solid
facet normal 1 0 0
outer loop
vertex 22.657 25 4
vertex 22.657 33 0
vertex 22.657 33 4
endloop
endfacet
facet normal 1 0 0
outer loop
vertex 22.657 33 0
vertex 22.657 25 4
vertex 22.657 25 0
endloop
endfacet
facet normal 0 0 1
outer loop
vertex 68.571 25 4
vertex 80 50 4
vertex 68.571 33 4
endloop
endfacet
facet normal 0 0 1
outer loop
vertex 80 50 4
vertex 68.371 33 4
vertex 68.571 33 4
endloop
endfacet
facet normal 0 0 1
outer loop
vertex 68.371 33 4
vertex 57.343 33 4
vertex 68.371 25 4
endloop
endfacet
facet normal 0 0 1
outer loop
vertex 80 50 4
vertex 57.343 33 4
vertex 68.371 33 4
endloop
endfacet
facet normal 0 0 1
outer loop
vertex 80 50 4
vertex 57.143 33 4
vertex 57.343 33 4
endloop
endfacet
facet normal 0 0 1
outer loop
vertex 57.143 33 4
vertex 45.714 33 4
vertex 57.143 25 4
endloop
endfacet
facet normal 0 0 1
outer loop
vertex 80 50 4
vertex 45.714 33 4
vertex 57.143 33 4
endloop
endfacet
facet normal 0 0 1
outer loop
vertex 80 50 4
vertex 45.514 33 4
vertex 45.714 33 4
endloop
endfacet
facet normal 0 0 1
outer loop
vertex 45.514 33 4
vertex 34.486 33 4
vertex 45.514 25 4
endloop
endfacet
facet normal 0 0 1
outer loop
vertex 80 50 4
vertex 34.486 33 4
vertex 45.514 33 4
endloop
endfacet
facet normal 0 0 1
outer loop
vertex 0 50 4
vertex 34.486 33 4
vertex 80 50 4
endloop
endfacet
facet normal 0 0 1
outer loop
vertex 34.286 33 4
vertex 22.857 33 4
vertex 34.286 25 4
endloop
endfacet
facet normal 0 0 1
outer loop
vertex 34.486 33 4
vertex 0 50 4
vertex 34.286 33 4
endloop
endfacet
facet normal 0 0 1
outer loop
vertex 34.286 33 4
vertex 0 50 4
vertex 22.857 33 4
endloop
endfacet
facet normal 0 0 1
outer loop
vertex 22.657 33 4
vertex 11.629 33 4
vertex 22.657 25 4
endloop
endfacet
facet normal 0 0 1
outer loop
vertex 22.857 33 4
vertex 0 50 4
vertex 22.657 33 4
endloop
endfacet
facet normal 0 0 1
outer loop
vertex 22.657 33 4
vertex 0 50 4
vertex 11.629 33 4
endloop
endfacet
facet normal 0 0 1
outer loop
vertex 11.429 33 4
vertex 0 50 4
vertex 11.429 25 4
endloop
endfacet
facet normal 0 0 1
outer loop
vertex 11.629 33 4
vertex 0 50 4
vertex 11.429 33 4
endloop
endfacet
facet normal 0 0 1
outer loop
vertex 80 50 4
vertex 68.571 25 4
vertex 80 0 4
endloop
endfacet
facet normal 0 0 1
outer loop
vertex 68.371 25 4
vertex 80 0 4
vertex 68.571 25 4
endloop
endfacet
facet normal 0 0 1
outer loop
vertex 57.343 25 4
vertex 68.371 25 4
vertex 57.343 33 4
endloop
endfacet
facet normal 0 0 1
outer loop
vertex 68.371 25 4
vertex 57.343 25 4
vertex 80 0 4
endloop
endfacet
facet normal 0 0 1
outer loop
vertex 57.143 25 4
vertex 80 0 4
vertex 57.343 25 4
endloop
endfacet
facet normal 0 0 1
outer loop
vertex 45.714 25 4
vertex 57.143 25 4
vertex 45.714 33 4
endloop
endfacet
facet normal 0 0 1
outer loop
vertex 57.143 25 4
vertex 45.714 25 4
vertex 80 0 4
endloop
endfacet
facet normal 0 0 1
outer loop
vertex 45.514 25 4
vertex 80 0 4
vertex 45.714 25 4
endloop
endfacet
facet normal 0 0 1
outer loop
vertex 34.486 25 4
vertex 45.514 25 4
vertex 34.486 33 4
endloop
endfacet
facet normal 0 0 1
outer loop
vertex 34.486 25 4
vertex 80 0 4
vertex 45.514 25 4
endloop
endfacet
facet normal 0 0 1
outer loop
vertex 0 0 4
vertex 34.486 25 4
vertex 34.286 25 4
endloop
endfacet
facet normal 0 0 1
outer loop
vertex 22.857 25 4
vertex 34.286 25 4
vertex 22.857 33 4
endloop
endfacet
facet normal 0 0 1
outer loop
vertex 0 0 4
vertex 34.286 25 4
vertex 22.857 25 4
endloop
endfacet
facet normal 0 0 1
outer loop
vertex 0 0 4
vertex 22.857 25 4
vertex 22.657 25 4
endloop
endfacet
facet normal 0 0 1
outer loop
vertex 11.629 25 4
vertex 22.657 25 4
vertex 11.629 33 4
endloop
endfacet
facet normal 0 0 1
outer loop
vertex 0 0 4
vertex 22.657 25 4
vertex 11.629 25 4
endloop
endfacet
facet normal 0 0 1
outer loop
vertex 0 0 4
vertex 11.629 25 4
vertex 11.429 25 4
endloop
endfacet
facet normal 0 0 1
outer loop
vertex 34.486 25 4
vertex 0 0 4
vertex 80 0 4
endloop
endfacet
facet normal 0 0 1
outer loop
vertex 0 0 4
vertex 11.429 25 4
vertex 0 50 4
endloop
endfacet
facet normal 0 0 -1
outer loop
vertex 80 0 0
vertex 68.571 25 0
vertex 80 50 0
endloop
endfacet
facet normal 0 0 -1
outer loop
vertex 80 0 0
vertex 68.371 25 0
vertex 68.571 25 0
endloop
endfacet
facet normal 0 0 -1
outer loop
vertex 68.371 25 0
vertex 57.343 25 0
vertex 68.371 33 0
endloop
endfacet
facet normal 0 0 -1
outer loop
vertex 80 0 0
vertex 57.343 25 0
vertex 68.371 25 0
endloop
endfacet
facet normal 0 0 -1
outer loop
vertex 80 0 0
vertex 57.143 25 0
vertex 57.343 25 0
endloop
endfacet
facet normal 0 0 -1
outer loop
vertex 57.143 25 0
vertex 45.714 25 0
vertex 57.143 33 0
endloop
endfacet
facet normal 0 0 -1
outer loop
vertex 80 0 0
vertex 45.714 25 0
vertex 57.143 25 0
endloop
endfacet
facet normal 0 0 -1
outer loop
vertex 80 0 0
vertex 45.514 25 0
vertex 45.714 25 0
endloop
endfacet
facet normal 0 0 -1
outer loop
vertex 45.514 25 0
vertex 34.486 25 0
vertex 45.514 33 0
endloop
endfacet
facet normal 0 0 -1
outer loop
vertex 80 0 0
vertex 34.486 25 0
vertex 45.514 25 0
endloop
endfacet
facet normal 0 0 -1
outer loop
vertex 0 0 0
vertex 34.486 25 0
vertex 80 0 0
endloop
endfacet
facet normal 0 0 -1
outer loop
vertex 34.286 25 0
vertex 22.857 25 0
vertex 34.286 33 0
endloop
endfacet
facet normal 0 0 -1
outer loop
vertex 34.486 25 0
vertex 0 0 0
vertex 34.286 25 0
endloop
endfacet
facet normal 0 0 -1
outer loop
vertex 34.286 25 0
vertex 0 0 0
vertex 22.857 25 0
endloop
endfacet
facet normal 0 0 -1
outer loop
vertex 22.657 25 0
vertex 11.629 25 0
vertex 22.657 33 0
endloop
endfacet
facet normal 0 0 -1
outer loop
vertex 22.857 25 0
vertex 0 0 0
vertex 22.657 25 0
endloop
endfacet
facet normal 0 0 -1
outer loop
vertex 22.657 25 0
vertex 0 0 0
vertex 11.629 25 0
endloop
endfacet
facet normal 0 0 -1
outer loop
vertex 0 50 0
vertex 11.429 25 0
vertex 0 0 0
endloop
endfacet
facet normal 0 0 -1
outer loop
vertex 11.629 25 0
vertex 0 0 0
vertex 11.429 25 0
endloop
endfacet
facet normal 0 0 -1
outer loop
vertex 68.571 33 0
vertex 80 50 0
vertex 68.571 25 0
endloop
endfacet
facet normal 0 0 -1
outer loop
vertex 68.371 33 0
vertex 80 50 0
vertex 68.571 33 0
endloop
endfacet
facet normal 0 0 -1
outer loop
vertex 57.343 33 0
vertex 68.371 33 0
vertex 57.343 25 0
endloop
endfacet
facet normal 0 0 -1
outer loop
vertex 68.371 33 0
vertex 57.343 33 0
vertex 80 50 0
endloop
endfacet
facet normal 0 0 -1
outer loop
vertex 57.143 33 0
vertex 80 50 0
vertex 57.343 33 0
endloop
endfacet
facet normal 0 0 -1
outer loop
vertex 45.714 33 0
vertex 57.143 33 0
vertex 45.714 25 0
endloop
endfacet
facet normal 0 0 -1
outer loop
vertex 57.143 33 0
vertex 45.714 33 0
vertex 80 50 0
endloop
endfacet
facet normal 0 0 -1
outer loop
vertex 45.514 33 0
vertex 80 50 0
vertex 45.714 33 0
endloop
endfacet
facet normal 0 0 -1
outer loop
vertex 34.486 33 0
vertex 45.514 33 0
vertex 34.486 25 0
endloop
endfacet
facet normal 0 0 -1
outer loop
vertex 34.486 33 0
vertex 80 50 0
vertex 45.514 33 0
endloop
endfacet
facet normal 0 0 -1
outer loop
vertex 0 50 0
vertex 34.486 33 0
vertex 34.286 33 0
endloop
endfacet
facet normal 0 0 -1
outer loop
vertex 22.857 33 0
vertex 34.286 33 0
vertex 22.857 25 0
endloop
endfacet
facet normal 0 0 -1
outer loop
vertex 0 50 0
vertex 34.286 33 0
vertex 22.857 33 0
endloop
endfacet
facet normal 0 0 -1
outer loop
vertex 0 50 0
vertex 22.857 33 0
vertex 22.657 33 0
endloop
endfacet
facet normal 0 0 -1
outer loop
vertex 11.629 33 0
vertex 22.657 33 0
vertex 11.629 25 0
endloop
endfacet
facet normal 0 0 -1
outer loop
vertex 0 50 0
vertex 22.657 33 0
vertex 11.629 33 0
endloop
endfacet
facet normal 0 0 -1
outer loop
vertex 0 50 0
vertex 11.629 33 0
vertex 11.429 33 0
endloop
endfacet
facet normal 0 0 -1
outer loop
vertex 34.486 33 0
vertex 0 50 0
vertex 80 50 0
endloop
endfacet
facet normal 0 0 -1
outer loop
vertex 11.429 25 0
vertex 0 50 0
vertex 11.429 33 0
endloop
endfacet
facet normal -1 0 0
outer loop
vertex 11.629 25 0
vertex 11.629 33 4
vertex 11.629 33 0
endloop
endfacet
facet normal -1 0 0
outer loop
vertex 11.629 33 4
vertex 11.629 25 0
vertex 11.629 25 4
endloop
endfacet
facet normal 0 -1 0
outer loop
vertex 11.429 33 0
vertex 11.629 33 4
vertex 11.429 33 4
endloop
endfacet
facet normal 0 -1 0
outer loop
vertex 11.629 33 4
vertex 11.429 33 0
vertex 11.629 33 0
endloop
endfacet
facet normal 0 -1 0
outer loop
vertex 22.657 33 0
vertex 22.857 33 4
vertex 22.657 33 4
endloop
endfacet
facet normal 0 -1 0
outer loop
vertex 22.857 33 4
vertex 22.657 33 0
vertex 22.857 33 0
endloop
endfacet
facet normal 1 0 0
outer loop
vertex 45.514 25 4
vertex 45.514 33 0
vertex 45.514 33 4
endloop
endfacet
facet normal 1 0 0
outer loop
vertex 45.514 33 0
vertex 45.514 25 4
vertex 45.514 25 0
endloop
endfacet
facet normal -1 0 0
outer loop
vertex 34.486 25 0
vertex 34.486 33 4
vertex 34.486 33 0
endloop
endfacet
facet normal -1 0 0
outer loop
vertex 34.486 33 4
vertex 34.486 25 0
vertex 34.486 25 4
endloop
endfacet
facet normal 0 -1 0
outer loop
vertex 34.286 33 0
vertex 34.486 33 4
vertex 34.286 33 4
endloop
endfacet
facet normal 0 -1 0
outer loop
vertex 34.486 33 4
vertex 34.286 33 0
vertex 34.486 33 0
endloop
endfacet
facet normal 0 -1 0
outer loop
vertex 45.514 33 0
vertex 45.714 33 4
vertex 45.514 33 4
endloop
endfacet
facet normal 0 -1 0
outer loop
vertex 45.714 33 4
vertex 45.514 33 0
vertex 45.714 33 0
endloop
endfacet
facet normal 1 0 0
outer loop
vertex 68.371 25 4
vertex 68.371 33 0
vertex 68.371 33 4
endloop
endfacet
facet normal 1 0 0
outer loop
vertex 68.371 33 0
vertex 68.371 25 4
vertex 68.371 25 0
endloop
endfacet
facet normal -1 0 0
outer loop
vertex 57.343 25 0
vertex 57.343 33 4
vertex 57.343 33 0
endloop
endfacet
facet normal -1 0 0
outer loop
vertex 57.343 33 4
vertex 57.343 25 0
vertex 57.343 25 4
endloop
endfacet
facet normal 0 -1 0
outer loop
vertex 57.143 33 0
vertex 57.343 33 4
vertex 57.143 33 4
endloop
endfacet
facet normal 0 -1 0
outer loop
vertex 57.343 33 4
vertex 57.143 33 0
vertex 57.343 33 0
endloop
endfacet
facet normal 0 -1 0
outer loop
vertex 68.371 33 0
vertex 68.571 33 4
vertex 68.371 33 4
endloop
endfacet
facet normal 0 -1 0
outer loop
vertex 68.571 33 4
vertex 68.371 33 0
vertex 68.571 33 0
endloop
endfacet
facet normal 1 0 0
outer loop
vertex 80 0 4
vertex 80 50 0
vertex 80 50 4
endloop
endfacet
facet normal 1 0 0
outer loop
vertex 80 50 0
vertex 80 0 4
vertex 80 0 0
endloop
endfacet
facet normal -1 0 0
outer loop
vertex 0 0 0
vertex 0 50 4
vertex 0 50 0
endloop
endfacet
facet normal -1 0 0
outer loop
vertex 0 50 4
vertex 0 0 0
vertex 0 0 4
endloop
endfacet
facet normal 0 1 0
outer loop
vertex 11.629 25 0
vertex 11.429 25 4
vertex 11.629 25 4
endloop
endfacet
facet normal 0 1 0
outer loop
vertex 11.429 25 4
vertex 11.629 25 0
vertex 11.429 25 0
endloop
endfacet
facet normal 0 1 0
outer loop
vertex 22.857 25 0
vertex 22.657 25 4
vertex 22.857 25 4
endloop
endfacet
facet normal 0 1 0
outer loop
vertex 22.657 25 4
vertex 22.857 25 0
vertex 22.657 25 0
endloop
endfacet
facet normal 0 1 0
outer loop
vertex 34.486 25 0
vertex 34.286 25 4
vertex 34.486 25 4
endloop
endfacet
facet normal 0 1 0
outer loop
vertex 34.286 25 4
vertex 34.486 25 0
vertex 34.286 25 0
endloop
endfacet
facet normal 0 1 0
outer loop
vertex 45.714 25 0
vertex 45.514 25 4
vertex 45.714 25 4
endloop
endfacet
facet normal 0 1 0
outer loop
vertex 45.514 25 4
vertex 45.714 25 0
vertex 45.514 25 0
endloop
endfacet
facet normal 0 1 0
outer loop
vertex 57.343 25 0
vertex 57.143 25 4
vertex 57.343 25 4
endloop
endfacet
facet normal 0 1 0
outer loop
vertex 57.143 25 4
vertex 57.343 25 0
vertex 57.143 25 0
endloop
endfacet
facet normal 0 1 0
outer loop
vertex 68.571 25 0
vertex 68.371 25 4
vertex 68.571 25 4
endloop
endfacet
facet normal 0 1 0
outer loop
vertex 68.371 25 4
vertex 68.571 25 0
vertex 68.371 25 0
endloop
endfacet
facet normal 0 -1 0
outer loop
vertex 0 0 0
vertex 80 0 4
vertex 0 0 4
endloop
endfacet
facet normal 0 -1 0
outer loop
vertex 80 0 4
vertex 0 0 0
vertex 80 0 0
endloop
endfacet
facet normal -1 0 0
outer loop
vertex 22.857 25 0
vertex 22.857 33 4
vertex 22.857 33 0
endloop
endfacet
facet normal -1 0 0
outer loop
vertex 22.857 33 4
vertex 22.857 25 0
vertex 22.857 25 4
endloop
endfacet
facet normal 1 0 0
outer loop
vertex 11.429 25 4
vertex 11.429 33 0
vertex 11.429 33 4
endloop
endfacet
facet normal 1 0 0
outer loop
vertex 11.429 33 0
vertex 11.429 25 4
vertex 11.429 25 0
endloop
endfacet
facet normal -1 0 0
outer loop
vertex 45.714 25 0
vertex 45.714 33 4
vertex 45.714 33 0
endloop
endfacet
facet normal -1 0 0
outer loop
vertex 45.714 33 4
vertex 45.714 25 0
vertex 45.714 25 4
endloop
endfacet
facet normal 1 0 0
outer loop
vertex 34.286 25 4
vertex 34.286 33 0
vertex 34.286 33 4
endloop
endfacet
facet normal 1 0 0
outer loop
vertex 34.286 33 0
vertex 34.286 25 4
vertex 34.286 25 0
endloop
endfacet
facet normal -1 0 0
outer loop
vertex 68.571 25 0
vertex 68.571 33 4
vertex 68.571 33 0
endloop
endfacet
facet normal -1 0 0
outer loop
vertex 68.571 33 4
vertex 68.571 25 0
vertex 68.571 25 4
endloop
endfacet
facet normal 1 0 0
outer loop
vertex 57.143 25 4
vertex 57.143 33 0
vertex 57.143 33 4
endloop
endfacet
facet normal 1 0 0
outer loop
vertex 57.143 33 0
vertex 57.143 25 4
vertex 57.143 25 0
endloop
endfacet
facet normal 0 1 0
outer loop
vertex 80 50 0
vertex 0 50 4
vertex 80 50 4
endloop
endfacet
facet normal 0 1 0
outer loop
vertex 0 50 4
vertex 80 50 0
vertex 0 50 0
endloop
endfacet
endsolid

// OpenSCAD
// file: ../lib/joinery.scad
// Finger/box joinery for splitting thin baseplates across the printer bed limit.
// Tabs and slots cut through the full plate thickness — flat puzzle-piece edges.
//
// Convention: both finger_tabs and finger_slots operate at Y=0 of their caller's
// local frame, extending into +Y. Position each piece in its own local frame:
//   - Tab-side piece: body at y ∈ [0, depth_a]; UNION finger_tabs translated to y=depth_a.
//   - Slot-side piece: body at y ∈ [0, depth_b], seam edge at y=0;
//                      DIFFERENCE finger_slots at y=0 (cuts into +Y).
//
// Tabs are shrunk by tol on each side so they slip into nominal-width slots
// without filing.

include <units.scad>;

FINGER_DEPTH = 8;  // how far tabs protrude / slots recess, mm
FINGER_TOL = 0.2;  // per-side clearance between tab and slot, mm

// Pattern: gap, tab, gap, tab, …, gap (N tabs, N+1 gaps = 2N+1 segments).
function _seg_w(seam_len, n_tabs) = seam_len / (2 * n_tabs + 1);

// One tab per ~25mm of seam, minimum 3.
function default_tab_count(seam_len) = max(3, floor(seam_len / 25));

// Tabs protruding from y=0 into +Y. Union with the body.
module finger_tabs(seam_len, thickness, n_tabs=undef,
                   finger_depth=FINGER_DEPTH, tol=FINGER_TOL) {
    n = is_undef(n_tabs) ? default_tab_count(seam_len) : n_tabs;
    w = _seg_w(seam_len, n);
    for (i = [0:n-1]) {
        x = (2*i + 1) * w;
        translate([x + tol, -EPS, 0])
            cube([w - 2*tol, finger_depth + EPS, thickness]);
    }
}

// Slot cutouts from y=0 into +Y. Difference from the body.
module finger_slots(seam_len, thickness, n_tabs=undef,
                    finger_depth=FINGER_DEPTH, tol=FINGER_TOL) {
    n = is_undef(n_tabs) ? default_tab_count(seam_len) : n_tabs;
    w = _seg_w(seam_len, n);
    for (i = [0:n-1]) {
        x = (2*i + 1) * w;
        translate([x, -EPS, -EPS])
            cube([w, finger_depth + EPS, thickness + 2*EPS]);
    }
}

// Woven variant: tab/slot at explicit X centers, each a given (narrow) width.
// Lets the joinery route AROUND a row of holes — tabs occupy the inter-hole
// gaps and the holes stay clean on the grid. Pair finger_tabs_at on one piece
// with finger_slots_at on the matching piece using the same x_centers.

module finger_tabs_at(x_centers, tab_w, thickness,
                      finger_depth=FINGER_DEPTH, tol=FINGER_TOL) {
    for (x = x_centers)
        translate([x - (tab_w - 2*tol)/2, -EPS, 0])
            cube([tab_w - 2*tol, finger_depth + EPS, thickness]);
}

module finger_slots_at(x_centers, tab_w, thickness,
                       finger_depth=FINGER_DEPTH, tol=FINGER_TOL) {
    for (x = x_centers)
        translate([x - tab_w/2, -EPS, -EPS])
            cube([tab_w, finger_depth + EPS, thickness + 2*EPS]);
}
// file: ../lib/units.scad
// Shared units and constants for the 40k terrain project.

INCH = 25.4;
PRINTER_BED = 256; // mm — max single-piece dimension before splitting
EPS = 0.01;        // small offset for clean boolean operations

function inches(n) = n * INCH;
// main file
// Joinery test — two small plates joined by a finger seam.
// Uses the same FINGER_DEPTH and FINGER_TOL as the real footprints, so a fit
// dialed in here transfers directly to the large_rect / wedge splits.
// Print both pieces, glue along the seam, confirm tabs slide cleanly without
// filing and stay seated with superglue.

include <../lib/units.scad>;
include <../lib/joinery.scad>;

SEAM = 80;             // seam length, mm — gives 3 tabs at default density
DEPTH_PER_PIECE = 25;  // each plate's depth in Y, mm
T = 4;                 // plate thickness, mm (matches BASEPLATE_T)

// "preview" | "piece_male" | "piece_female"
RENDER = "preview";

// Male half: carries the protruding finger tabs.
module piece_male() {
    union() {
        cube([SEAM, DEPTH_PER_PIECE, T]);
        translate([0, DEPTH_PER_PIECE, 0])
            finger_tabs(seam_len=SEAM, thickness=T);
    }
}

// Female half: receives the tabs in matching slots.
module piece_female() {
    difference() {
        cube([SEAM, DEPTH_PER_PIECE, T]);
        finger_slots(seam_len=SEAM, thickness=T);
    }
}

if (RENDER == "piece_male") piece_male();
else if (RENDER == "piece_female") piece_female();
else {
    piece_male();
    translate([0, DEPTH_PER_PIECE, 0]) piece_female();
}
